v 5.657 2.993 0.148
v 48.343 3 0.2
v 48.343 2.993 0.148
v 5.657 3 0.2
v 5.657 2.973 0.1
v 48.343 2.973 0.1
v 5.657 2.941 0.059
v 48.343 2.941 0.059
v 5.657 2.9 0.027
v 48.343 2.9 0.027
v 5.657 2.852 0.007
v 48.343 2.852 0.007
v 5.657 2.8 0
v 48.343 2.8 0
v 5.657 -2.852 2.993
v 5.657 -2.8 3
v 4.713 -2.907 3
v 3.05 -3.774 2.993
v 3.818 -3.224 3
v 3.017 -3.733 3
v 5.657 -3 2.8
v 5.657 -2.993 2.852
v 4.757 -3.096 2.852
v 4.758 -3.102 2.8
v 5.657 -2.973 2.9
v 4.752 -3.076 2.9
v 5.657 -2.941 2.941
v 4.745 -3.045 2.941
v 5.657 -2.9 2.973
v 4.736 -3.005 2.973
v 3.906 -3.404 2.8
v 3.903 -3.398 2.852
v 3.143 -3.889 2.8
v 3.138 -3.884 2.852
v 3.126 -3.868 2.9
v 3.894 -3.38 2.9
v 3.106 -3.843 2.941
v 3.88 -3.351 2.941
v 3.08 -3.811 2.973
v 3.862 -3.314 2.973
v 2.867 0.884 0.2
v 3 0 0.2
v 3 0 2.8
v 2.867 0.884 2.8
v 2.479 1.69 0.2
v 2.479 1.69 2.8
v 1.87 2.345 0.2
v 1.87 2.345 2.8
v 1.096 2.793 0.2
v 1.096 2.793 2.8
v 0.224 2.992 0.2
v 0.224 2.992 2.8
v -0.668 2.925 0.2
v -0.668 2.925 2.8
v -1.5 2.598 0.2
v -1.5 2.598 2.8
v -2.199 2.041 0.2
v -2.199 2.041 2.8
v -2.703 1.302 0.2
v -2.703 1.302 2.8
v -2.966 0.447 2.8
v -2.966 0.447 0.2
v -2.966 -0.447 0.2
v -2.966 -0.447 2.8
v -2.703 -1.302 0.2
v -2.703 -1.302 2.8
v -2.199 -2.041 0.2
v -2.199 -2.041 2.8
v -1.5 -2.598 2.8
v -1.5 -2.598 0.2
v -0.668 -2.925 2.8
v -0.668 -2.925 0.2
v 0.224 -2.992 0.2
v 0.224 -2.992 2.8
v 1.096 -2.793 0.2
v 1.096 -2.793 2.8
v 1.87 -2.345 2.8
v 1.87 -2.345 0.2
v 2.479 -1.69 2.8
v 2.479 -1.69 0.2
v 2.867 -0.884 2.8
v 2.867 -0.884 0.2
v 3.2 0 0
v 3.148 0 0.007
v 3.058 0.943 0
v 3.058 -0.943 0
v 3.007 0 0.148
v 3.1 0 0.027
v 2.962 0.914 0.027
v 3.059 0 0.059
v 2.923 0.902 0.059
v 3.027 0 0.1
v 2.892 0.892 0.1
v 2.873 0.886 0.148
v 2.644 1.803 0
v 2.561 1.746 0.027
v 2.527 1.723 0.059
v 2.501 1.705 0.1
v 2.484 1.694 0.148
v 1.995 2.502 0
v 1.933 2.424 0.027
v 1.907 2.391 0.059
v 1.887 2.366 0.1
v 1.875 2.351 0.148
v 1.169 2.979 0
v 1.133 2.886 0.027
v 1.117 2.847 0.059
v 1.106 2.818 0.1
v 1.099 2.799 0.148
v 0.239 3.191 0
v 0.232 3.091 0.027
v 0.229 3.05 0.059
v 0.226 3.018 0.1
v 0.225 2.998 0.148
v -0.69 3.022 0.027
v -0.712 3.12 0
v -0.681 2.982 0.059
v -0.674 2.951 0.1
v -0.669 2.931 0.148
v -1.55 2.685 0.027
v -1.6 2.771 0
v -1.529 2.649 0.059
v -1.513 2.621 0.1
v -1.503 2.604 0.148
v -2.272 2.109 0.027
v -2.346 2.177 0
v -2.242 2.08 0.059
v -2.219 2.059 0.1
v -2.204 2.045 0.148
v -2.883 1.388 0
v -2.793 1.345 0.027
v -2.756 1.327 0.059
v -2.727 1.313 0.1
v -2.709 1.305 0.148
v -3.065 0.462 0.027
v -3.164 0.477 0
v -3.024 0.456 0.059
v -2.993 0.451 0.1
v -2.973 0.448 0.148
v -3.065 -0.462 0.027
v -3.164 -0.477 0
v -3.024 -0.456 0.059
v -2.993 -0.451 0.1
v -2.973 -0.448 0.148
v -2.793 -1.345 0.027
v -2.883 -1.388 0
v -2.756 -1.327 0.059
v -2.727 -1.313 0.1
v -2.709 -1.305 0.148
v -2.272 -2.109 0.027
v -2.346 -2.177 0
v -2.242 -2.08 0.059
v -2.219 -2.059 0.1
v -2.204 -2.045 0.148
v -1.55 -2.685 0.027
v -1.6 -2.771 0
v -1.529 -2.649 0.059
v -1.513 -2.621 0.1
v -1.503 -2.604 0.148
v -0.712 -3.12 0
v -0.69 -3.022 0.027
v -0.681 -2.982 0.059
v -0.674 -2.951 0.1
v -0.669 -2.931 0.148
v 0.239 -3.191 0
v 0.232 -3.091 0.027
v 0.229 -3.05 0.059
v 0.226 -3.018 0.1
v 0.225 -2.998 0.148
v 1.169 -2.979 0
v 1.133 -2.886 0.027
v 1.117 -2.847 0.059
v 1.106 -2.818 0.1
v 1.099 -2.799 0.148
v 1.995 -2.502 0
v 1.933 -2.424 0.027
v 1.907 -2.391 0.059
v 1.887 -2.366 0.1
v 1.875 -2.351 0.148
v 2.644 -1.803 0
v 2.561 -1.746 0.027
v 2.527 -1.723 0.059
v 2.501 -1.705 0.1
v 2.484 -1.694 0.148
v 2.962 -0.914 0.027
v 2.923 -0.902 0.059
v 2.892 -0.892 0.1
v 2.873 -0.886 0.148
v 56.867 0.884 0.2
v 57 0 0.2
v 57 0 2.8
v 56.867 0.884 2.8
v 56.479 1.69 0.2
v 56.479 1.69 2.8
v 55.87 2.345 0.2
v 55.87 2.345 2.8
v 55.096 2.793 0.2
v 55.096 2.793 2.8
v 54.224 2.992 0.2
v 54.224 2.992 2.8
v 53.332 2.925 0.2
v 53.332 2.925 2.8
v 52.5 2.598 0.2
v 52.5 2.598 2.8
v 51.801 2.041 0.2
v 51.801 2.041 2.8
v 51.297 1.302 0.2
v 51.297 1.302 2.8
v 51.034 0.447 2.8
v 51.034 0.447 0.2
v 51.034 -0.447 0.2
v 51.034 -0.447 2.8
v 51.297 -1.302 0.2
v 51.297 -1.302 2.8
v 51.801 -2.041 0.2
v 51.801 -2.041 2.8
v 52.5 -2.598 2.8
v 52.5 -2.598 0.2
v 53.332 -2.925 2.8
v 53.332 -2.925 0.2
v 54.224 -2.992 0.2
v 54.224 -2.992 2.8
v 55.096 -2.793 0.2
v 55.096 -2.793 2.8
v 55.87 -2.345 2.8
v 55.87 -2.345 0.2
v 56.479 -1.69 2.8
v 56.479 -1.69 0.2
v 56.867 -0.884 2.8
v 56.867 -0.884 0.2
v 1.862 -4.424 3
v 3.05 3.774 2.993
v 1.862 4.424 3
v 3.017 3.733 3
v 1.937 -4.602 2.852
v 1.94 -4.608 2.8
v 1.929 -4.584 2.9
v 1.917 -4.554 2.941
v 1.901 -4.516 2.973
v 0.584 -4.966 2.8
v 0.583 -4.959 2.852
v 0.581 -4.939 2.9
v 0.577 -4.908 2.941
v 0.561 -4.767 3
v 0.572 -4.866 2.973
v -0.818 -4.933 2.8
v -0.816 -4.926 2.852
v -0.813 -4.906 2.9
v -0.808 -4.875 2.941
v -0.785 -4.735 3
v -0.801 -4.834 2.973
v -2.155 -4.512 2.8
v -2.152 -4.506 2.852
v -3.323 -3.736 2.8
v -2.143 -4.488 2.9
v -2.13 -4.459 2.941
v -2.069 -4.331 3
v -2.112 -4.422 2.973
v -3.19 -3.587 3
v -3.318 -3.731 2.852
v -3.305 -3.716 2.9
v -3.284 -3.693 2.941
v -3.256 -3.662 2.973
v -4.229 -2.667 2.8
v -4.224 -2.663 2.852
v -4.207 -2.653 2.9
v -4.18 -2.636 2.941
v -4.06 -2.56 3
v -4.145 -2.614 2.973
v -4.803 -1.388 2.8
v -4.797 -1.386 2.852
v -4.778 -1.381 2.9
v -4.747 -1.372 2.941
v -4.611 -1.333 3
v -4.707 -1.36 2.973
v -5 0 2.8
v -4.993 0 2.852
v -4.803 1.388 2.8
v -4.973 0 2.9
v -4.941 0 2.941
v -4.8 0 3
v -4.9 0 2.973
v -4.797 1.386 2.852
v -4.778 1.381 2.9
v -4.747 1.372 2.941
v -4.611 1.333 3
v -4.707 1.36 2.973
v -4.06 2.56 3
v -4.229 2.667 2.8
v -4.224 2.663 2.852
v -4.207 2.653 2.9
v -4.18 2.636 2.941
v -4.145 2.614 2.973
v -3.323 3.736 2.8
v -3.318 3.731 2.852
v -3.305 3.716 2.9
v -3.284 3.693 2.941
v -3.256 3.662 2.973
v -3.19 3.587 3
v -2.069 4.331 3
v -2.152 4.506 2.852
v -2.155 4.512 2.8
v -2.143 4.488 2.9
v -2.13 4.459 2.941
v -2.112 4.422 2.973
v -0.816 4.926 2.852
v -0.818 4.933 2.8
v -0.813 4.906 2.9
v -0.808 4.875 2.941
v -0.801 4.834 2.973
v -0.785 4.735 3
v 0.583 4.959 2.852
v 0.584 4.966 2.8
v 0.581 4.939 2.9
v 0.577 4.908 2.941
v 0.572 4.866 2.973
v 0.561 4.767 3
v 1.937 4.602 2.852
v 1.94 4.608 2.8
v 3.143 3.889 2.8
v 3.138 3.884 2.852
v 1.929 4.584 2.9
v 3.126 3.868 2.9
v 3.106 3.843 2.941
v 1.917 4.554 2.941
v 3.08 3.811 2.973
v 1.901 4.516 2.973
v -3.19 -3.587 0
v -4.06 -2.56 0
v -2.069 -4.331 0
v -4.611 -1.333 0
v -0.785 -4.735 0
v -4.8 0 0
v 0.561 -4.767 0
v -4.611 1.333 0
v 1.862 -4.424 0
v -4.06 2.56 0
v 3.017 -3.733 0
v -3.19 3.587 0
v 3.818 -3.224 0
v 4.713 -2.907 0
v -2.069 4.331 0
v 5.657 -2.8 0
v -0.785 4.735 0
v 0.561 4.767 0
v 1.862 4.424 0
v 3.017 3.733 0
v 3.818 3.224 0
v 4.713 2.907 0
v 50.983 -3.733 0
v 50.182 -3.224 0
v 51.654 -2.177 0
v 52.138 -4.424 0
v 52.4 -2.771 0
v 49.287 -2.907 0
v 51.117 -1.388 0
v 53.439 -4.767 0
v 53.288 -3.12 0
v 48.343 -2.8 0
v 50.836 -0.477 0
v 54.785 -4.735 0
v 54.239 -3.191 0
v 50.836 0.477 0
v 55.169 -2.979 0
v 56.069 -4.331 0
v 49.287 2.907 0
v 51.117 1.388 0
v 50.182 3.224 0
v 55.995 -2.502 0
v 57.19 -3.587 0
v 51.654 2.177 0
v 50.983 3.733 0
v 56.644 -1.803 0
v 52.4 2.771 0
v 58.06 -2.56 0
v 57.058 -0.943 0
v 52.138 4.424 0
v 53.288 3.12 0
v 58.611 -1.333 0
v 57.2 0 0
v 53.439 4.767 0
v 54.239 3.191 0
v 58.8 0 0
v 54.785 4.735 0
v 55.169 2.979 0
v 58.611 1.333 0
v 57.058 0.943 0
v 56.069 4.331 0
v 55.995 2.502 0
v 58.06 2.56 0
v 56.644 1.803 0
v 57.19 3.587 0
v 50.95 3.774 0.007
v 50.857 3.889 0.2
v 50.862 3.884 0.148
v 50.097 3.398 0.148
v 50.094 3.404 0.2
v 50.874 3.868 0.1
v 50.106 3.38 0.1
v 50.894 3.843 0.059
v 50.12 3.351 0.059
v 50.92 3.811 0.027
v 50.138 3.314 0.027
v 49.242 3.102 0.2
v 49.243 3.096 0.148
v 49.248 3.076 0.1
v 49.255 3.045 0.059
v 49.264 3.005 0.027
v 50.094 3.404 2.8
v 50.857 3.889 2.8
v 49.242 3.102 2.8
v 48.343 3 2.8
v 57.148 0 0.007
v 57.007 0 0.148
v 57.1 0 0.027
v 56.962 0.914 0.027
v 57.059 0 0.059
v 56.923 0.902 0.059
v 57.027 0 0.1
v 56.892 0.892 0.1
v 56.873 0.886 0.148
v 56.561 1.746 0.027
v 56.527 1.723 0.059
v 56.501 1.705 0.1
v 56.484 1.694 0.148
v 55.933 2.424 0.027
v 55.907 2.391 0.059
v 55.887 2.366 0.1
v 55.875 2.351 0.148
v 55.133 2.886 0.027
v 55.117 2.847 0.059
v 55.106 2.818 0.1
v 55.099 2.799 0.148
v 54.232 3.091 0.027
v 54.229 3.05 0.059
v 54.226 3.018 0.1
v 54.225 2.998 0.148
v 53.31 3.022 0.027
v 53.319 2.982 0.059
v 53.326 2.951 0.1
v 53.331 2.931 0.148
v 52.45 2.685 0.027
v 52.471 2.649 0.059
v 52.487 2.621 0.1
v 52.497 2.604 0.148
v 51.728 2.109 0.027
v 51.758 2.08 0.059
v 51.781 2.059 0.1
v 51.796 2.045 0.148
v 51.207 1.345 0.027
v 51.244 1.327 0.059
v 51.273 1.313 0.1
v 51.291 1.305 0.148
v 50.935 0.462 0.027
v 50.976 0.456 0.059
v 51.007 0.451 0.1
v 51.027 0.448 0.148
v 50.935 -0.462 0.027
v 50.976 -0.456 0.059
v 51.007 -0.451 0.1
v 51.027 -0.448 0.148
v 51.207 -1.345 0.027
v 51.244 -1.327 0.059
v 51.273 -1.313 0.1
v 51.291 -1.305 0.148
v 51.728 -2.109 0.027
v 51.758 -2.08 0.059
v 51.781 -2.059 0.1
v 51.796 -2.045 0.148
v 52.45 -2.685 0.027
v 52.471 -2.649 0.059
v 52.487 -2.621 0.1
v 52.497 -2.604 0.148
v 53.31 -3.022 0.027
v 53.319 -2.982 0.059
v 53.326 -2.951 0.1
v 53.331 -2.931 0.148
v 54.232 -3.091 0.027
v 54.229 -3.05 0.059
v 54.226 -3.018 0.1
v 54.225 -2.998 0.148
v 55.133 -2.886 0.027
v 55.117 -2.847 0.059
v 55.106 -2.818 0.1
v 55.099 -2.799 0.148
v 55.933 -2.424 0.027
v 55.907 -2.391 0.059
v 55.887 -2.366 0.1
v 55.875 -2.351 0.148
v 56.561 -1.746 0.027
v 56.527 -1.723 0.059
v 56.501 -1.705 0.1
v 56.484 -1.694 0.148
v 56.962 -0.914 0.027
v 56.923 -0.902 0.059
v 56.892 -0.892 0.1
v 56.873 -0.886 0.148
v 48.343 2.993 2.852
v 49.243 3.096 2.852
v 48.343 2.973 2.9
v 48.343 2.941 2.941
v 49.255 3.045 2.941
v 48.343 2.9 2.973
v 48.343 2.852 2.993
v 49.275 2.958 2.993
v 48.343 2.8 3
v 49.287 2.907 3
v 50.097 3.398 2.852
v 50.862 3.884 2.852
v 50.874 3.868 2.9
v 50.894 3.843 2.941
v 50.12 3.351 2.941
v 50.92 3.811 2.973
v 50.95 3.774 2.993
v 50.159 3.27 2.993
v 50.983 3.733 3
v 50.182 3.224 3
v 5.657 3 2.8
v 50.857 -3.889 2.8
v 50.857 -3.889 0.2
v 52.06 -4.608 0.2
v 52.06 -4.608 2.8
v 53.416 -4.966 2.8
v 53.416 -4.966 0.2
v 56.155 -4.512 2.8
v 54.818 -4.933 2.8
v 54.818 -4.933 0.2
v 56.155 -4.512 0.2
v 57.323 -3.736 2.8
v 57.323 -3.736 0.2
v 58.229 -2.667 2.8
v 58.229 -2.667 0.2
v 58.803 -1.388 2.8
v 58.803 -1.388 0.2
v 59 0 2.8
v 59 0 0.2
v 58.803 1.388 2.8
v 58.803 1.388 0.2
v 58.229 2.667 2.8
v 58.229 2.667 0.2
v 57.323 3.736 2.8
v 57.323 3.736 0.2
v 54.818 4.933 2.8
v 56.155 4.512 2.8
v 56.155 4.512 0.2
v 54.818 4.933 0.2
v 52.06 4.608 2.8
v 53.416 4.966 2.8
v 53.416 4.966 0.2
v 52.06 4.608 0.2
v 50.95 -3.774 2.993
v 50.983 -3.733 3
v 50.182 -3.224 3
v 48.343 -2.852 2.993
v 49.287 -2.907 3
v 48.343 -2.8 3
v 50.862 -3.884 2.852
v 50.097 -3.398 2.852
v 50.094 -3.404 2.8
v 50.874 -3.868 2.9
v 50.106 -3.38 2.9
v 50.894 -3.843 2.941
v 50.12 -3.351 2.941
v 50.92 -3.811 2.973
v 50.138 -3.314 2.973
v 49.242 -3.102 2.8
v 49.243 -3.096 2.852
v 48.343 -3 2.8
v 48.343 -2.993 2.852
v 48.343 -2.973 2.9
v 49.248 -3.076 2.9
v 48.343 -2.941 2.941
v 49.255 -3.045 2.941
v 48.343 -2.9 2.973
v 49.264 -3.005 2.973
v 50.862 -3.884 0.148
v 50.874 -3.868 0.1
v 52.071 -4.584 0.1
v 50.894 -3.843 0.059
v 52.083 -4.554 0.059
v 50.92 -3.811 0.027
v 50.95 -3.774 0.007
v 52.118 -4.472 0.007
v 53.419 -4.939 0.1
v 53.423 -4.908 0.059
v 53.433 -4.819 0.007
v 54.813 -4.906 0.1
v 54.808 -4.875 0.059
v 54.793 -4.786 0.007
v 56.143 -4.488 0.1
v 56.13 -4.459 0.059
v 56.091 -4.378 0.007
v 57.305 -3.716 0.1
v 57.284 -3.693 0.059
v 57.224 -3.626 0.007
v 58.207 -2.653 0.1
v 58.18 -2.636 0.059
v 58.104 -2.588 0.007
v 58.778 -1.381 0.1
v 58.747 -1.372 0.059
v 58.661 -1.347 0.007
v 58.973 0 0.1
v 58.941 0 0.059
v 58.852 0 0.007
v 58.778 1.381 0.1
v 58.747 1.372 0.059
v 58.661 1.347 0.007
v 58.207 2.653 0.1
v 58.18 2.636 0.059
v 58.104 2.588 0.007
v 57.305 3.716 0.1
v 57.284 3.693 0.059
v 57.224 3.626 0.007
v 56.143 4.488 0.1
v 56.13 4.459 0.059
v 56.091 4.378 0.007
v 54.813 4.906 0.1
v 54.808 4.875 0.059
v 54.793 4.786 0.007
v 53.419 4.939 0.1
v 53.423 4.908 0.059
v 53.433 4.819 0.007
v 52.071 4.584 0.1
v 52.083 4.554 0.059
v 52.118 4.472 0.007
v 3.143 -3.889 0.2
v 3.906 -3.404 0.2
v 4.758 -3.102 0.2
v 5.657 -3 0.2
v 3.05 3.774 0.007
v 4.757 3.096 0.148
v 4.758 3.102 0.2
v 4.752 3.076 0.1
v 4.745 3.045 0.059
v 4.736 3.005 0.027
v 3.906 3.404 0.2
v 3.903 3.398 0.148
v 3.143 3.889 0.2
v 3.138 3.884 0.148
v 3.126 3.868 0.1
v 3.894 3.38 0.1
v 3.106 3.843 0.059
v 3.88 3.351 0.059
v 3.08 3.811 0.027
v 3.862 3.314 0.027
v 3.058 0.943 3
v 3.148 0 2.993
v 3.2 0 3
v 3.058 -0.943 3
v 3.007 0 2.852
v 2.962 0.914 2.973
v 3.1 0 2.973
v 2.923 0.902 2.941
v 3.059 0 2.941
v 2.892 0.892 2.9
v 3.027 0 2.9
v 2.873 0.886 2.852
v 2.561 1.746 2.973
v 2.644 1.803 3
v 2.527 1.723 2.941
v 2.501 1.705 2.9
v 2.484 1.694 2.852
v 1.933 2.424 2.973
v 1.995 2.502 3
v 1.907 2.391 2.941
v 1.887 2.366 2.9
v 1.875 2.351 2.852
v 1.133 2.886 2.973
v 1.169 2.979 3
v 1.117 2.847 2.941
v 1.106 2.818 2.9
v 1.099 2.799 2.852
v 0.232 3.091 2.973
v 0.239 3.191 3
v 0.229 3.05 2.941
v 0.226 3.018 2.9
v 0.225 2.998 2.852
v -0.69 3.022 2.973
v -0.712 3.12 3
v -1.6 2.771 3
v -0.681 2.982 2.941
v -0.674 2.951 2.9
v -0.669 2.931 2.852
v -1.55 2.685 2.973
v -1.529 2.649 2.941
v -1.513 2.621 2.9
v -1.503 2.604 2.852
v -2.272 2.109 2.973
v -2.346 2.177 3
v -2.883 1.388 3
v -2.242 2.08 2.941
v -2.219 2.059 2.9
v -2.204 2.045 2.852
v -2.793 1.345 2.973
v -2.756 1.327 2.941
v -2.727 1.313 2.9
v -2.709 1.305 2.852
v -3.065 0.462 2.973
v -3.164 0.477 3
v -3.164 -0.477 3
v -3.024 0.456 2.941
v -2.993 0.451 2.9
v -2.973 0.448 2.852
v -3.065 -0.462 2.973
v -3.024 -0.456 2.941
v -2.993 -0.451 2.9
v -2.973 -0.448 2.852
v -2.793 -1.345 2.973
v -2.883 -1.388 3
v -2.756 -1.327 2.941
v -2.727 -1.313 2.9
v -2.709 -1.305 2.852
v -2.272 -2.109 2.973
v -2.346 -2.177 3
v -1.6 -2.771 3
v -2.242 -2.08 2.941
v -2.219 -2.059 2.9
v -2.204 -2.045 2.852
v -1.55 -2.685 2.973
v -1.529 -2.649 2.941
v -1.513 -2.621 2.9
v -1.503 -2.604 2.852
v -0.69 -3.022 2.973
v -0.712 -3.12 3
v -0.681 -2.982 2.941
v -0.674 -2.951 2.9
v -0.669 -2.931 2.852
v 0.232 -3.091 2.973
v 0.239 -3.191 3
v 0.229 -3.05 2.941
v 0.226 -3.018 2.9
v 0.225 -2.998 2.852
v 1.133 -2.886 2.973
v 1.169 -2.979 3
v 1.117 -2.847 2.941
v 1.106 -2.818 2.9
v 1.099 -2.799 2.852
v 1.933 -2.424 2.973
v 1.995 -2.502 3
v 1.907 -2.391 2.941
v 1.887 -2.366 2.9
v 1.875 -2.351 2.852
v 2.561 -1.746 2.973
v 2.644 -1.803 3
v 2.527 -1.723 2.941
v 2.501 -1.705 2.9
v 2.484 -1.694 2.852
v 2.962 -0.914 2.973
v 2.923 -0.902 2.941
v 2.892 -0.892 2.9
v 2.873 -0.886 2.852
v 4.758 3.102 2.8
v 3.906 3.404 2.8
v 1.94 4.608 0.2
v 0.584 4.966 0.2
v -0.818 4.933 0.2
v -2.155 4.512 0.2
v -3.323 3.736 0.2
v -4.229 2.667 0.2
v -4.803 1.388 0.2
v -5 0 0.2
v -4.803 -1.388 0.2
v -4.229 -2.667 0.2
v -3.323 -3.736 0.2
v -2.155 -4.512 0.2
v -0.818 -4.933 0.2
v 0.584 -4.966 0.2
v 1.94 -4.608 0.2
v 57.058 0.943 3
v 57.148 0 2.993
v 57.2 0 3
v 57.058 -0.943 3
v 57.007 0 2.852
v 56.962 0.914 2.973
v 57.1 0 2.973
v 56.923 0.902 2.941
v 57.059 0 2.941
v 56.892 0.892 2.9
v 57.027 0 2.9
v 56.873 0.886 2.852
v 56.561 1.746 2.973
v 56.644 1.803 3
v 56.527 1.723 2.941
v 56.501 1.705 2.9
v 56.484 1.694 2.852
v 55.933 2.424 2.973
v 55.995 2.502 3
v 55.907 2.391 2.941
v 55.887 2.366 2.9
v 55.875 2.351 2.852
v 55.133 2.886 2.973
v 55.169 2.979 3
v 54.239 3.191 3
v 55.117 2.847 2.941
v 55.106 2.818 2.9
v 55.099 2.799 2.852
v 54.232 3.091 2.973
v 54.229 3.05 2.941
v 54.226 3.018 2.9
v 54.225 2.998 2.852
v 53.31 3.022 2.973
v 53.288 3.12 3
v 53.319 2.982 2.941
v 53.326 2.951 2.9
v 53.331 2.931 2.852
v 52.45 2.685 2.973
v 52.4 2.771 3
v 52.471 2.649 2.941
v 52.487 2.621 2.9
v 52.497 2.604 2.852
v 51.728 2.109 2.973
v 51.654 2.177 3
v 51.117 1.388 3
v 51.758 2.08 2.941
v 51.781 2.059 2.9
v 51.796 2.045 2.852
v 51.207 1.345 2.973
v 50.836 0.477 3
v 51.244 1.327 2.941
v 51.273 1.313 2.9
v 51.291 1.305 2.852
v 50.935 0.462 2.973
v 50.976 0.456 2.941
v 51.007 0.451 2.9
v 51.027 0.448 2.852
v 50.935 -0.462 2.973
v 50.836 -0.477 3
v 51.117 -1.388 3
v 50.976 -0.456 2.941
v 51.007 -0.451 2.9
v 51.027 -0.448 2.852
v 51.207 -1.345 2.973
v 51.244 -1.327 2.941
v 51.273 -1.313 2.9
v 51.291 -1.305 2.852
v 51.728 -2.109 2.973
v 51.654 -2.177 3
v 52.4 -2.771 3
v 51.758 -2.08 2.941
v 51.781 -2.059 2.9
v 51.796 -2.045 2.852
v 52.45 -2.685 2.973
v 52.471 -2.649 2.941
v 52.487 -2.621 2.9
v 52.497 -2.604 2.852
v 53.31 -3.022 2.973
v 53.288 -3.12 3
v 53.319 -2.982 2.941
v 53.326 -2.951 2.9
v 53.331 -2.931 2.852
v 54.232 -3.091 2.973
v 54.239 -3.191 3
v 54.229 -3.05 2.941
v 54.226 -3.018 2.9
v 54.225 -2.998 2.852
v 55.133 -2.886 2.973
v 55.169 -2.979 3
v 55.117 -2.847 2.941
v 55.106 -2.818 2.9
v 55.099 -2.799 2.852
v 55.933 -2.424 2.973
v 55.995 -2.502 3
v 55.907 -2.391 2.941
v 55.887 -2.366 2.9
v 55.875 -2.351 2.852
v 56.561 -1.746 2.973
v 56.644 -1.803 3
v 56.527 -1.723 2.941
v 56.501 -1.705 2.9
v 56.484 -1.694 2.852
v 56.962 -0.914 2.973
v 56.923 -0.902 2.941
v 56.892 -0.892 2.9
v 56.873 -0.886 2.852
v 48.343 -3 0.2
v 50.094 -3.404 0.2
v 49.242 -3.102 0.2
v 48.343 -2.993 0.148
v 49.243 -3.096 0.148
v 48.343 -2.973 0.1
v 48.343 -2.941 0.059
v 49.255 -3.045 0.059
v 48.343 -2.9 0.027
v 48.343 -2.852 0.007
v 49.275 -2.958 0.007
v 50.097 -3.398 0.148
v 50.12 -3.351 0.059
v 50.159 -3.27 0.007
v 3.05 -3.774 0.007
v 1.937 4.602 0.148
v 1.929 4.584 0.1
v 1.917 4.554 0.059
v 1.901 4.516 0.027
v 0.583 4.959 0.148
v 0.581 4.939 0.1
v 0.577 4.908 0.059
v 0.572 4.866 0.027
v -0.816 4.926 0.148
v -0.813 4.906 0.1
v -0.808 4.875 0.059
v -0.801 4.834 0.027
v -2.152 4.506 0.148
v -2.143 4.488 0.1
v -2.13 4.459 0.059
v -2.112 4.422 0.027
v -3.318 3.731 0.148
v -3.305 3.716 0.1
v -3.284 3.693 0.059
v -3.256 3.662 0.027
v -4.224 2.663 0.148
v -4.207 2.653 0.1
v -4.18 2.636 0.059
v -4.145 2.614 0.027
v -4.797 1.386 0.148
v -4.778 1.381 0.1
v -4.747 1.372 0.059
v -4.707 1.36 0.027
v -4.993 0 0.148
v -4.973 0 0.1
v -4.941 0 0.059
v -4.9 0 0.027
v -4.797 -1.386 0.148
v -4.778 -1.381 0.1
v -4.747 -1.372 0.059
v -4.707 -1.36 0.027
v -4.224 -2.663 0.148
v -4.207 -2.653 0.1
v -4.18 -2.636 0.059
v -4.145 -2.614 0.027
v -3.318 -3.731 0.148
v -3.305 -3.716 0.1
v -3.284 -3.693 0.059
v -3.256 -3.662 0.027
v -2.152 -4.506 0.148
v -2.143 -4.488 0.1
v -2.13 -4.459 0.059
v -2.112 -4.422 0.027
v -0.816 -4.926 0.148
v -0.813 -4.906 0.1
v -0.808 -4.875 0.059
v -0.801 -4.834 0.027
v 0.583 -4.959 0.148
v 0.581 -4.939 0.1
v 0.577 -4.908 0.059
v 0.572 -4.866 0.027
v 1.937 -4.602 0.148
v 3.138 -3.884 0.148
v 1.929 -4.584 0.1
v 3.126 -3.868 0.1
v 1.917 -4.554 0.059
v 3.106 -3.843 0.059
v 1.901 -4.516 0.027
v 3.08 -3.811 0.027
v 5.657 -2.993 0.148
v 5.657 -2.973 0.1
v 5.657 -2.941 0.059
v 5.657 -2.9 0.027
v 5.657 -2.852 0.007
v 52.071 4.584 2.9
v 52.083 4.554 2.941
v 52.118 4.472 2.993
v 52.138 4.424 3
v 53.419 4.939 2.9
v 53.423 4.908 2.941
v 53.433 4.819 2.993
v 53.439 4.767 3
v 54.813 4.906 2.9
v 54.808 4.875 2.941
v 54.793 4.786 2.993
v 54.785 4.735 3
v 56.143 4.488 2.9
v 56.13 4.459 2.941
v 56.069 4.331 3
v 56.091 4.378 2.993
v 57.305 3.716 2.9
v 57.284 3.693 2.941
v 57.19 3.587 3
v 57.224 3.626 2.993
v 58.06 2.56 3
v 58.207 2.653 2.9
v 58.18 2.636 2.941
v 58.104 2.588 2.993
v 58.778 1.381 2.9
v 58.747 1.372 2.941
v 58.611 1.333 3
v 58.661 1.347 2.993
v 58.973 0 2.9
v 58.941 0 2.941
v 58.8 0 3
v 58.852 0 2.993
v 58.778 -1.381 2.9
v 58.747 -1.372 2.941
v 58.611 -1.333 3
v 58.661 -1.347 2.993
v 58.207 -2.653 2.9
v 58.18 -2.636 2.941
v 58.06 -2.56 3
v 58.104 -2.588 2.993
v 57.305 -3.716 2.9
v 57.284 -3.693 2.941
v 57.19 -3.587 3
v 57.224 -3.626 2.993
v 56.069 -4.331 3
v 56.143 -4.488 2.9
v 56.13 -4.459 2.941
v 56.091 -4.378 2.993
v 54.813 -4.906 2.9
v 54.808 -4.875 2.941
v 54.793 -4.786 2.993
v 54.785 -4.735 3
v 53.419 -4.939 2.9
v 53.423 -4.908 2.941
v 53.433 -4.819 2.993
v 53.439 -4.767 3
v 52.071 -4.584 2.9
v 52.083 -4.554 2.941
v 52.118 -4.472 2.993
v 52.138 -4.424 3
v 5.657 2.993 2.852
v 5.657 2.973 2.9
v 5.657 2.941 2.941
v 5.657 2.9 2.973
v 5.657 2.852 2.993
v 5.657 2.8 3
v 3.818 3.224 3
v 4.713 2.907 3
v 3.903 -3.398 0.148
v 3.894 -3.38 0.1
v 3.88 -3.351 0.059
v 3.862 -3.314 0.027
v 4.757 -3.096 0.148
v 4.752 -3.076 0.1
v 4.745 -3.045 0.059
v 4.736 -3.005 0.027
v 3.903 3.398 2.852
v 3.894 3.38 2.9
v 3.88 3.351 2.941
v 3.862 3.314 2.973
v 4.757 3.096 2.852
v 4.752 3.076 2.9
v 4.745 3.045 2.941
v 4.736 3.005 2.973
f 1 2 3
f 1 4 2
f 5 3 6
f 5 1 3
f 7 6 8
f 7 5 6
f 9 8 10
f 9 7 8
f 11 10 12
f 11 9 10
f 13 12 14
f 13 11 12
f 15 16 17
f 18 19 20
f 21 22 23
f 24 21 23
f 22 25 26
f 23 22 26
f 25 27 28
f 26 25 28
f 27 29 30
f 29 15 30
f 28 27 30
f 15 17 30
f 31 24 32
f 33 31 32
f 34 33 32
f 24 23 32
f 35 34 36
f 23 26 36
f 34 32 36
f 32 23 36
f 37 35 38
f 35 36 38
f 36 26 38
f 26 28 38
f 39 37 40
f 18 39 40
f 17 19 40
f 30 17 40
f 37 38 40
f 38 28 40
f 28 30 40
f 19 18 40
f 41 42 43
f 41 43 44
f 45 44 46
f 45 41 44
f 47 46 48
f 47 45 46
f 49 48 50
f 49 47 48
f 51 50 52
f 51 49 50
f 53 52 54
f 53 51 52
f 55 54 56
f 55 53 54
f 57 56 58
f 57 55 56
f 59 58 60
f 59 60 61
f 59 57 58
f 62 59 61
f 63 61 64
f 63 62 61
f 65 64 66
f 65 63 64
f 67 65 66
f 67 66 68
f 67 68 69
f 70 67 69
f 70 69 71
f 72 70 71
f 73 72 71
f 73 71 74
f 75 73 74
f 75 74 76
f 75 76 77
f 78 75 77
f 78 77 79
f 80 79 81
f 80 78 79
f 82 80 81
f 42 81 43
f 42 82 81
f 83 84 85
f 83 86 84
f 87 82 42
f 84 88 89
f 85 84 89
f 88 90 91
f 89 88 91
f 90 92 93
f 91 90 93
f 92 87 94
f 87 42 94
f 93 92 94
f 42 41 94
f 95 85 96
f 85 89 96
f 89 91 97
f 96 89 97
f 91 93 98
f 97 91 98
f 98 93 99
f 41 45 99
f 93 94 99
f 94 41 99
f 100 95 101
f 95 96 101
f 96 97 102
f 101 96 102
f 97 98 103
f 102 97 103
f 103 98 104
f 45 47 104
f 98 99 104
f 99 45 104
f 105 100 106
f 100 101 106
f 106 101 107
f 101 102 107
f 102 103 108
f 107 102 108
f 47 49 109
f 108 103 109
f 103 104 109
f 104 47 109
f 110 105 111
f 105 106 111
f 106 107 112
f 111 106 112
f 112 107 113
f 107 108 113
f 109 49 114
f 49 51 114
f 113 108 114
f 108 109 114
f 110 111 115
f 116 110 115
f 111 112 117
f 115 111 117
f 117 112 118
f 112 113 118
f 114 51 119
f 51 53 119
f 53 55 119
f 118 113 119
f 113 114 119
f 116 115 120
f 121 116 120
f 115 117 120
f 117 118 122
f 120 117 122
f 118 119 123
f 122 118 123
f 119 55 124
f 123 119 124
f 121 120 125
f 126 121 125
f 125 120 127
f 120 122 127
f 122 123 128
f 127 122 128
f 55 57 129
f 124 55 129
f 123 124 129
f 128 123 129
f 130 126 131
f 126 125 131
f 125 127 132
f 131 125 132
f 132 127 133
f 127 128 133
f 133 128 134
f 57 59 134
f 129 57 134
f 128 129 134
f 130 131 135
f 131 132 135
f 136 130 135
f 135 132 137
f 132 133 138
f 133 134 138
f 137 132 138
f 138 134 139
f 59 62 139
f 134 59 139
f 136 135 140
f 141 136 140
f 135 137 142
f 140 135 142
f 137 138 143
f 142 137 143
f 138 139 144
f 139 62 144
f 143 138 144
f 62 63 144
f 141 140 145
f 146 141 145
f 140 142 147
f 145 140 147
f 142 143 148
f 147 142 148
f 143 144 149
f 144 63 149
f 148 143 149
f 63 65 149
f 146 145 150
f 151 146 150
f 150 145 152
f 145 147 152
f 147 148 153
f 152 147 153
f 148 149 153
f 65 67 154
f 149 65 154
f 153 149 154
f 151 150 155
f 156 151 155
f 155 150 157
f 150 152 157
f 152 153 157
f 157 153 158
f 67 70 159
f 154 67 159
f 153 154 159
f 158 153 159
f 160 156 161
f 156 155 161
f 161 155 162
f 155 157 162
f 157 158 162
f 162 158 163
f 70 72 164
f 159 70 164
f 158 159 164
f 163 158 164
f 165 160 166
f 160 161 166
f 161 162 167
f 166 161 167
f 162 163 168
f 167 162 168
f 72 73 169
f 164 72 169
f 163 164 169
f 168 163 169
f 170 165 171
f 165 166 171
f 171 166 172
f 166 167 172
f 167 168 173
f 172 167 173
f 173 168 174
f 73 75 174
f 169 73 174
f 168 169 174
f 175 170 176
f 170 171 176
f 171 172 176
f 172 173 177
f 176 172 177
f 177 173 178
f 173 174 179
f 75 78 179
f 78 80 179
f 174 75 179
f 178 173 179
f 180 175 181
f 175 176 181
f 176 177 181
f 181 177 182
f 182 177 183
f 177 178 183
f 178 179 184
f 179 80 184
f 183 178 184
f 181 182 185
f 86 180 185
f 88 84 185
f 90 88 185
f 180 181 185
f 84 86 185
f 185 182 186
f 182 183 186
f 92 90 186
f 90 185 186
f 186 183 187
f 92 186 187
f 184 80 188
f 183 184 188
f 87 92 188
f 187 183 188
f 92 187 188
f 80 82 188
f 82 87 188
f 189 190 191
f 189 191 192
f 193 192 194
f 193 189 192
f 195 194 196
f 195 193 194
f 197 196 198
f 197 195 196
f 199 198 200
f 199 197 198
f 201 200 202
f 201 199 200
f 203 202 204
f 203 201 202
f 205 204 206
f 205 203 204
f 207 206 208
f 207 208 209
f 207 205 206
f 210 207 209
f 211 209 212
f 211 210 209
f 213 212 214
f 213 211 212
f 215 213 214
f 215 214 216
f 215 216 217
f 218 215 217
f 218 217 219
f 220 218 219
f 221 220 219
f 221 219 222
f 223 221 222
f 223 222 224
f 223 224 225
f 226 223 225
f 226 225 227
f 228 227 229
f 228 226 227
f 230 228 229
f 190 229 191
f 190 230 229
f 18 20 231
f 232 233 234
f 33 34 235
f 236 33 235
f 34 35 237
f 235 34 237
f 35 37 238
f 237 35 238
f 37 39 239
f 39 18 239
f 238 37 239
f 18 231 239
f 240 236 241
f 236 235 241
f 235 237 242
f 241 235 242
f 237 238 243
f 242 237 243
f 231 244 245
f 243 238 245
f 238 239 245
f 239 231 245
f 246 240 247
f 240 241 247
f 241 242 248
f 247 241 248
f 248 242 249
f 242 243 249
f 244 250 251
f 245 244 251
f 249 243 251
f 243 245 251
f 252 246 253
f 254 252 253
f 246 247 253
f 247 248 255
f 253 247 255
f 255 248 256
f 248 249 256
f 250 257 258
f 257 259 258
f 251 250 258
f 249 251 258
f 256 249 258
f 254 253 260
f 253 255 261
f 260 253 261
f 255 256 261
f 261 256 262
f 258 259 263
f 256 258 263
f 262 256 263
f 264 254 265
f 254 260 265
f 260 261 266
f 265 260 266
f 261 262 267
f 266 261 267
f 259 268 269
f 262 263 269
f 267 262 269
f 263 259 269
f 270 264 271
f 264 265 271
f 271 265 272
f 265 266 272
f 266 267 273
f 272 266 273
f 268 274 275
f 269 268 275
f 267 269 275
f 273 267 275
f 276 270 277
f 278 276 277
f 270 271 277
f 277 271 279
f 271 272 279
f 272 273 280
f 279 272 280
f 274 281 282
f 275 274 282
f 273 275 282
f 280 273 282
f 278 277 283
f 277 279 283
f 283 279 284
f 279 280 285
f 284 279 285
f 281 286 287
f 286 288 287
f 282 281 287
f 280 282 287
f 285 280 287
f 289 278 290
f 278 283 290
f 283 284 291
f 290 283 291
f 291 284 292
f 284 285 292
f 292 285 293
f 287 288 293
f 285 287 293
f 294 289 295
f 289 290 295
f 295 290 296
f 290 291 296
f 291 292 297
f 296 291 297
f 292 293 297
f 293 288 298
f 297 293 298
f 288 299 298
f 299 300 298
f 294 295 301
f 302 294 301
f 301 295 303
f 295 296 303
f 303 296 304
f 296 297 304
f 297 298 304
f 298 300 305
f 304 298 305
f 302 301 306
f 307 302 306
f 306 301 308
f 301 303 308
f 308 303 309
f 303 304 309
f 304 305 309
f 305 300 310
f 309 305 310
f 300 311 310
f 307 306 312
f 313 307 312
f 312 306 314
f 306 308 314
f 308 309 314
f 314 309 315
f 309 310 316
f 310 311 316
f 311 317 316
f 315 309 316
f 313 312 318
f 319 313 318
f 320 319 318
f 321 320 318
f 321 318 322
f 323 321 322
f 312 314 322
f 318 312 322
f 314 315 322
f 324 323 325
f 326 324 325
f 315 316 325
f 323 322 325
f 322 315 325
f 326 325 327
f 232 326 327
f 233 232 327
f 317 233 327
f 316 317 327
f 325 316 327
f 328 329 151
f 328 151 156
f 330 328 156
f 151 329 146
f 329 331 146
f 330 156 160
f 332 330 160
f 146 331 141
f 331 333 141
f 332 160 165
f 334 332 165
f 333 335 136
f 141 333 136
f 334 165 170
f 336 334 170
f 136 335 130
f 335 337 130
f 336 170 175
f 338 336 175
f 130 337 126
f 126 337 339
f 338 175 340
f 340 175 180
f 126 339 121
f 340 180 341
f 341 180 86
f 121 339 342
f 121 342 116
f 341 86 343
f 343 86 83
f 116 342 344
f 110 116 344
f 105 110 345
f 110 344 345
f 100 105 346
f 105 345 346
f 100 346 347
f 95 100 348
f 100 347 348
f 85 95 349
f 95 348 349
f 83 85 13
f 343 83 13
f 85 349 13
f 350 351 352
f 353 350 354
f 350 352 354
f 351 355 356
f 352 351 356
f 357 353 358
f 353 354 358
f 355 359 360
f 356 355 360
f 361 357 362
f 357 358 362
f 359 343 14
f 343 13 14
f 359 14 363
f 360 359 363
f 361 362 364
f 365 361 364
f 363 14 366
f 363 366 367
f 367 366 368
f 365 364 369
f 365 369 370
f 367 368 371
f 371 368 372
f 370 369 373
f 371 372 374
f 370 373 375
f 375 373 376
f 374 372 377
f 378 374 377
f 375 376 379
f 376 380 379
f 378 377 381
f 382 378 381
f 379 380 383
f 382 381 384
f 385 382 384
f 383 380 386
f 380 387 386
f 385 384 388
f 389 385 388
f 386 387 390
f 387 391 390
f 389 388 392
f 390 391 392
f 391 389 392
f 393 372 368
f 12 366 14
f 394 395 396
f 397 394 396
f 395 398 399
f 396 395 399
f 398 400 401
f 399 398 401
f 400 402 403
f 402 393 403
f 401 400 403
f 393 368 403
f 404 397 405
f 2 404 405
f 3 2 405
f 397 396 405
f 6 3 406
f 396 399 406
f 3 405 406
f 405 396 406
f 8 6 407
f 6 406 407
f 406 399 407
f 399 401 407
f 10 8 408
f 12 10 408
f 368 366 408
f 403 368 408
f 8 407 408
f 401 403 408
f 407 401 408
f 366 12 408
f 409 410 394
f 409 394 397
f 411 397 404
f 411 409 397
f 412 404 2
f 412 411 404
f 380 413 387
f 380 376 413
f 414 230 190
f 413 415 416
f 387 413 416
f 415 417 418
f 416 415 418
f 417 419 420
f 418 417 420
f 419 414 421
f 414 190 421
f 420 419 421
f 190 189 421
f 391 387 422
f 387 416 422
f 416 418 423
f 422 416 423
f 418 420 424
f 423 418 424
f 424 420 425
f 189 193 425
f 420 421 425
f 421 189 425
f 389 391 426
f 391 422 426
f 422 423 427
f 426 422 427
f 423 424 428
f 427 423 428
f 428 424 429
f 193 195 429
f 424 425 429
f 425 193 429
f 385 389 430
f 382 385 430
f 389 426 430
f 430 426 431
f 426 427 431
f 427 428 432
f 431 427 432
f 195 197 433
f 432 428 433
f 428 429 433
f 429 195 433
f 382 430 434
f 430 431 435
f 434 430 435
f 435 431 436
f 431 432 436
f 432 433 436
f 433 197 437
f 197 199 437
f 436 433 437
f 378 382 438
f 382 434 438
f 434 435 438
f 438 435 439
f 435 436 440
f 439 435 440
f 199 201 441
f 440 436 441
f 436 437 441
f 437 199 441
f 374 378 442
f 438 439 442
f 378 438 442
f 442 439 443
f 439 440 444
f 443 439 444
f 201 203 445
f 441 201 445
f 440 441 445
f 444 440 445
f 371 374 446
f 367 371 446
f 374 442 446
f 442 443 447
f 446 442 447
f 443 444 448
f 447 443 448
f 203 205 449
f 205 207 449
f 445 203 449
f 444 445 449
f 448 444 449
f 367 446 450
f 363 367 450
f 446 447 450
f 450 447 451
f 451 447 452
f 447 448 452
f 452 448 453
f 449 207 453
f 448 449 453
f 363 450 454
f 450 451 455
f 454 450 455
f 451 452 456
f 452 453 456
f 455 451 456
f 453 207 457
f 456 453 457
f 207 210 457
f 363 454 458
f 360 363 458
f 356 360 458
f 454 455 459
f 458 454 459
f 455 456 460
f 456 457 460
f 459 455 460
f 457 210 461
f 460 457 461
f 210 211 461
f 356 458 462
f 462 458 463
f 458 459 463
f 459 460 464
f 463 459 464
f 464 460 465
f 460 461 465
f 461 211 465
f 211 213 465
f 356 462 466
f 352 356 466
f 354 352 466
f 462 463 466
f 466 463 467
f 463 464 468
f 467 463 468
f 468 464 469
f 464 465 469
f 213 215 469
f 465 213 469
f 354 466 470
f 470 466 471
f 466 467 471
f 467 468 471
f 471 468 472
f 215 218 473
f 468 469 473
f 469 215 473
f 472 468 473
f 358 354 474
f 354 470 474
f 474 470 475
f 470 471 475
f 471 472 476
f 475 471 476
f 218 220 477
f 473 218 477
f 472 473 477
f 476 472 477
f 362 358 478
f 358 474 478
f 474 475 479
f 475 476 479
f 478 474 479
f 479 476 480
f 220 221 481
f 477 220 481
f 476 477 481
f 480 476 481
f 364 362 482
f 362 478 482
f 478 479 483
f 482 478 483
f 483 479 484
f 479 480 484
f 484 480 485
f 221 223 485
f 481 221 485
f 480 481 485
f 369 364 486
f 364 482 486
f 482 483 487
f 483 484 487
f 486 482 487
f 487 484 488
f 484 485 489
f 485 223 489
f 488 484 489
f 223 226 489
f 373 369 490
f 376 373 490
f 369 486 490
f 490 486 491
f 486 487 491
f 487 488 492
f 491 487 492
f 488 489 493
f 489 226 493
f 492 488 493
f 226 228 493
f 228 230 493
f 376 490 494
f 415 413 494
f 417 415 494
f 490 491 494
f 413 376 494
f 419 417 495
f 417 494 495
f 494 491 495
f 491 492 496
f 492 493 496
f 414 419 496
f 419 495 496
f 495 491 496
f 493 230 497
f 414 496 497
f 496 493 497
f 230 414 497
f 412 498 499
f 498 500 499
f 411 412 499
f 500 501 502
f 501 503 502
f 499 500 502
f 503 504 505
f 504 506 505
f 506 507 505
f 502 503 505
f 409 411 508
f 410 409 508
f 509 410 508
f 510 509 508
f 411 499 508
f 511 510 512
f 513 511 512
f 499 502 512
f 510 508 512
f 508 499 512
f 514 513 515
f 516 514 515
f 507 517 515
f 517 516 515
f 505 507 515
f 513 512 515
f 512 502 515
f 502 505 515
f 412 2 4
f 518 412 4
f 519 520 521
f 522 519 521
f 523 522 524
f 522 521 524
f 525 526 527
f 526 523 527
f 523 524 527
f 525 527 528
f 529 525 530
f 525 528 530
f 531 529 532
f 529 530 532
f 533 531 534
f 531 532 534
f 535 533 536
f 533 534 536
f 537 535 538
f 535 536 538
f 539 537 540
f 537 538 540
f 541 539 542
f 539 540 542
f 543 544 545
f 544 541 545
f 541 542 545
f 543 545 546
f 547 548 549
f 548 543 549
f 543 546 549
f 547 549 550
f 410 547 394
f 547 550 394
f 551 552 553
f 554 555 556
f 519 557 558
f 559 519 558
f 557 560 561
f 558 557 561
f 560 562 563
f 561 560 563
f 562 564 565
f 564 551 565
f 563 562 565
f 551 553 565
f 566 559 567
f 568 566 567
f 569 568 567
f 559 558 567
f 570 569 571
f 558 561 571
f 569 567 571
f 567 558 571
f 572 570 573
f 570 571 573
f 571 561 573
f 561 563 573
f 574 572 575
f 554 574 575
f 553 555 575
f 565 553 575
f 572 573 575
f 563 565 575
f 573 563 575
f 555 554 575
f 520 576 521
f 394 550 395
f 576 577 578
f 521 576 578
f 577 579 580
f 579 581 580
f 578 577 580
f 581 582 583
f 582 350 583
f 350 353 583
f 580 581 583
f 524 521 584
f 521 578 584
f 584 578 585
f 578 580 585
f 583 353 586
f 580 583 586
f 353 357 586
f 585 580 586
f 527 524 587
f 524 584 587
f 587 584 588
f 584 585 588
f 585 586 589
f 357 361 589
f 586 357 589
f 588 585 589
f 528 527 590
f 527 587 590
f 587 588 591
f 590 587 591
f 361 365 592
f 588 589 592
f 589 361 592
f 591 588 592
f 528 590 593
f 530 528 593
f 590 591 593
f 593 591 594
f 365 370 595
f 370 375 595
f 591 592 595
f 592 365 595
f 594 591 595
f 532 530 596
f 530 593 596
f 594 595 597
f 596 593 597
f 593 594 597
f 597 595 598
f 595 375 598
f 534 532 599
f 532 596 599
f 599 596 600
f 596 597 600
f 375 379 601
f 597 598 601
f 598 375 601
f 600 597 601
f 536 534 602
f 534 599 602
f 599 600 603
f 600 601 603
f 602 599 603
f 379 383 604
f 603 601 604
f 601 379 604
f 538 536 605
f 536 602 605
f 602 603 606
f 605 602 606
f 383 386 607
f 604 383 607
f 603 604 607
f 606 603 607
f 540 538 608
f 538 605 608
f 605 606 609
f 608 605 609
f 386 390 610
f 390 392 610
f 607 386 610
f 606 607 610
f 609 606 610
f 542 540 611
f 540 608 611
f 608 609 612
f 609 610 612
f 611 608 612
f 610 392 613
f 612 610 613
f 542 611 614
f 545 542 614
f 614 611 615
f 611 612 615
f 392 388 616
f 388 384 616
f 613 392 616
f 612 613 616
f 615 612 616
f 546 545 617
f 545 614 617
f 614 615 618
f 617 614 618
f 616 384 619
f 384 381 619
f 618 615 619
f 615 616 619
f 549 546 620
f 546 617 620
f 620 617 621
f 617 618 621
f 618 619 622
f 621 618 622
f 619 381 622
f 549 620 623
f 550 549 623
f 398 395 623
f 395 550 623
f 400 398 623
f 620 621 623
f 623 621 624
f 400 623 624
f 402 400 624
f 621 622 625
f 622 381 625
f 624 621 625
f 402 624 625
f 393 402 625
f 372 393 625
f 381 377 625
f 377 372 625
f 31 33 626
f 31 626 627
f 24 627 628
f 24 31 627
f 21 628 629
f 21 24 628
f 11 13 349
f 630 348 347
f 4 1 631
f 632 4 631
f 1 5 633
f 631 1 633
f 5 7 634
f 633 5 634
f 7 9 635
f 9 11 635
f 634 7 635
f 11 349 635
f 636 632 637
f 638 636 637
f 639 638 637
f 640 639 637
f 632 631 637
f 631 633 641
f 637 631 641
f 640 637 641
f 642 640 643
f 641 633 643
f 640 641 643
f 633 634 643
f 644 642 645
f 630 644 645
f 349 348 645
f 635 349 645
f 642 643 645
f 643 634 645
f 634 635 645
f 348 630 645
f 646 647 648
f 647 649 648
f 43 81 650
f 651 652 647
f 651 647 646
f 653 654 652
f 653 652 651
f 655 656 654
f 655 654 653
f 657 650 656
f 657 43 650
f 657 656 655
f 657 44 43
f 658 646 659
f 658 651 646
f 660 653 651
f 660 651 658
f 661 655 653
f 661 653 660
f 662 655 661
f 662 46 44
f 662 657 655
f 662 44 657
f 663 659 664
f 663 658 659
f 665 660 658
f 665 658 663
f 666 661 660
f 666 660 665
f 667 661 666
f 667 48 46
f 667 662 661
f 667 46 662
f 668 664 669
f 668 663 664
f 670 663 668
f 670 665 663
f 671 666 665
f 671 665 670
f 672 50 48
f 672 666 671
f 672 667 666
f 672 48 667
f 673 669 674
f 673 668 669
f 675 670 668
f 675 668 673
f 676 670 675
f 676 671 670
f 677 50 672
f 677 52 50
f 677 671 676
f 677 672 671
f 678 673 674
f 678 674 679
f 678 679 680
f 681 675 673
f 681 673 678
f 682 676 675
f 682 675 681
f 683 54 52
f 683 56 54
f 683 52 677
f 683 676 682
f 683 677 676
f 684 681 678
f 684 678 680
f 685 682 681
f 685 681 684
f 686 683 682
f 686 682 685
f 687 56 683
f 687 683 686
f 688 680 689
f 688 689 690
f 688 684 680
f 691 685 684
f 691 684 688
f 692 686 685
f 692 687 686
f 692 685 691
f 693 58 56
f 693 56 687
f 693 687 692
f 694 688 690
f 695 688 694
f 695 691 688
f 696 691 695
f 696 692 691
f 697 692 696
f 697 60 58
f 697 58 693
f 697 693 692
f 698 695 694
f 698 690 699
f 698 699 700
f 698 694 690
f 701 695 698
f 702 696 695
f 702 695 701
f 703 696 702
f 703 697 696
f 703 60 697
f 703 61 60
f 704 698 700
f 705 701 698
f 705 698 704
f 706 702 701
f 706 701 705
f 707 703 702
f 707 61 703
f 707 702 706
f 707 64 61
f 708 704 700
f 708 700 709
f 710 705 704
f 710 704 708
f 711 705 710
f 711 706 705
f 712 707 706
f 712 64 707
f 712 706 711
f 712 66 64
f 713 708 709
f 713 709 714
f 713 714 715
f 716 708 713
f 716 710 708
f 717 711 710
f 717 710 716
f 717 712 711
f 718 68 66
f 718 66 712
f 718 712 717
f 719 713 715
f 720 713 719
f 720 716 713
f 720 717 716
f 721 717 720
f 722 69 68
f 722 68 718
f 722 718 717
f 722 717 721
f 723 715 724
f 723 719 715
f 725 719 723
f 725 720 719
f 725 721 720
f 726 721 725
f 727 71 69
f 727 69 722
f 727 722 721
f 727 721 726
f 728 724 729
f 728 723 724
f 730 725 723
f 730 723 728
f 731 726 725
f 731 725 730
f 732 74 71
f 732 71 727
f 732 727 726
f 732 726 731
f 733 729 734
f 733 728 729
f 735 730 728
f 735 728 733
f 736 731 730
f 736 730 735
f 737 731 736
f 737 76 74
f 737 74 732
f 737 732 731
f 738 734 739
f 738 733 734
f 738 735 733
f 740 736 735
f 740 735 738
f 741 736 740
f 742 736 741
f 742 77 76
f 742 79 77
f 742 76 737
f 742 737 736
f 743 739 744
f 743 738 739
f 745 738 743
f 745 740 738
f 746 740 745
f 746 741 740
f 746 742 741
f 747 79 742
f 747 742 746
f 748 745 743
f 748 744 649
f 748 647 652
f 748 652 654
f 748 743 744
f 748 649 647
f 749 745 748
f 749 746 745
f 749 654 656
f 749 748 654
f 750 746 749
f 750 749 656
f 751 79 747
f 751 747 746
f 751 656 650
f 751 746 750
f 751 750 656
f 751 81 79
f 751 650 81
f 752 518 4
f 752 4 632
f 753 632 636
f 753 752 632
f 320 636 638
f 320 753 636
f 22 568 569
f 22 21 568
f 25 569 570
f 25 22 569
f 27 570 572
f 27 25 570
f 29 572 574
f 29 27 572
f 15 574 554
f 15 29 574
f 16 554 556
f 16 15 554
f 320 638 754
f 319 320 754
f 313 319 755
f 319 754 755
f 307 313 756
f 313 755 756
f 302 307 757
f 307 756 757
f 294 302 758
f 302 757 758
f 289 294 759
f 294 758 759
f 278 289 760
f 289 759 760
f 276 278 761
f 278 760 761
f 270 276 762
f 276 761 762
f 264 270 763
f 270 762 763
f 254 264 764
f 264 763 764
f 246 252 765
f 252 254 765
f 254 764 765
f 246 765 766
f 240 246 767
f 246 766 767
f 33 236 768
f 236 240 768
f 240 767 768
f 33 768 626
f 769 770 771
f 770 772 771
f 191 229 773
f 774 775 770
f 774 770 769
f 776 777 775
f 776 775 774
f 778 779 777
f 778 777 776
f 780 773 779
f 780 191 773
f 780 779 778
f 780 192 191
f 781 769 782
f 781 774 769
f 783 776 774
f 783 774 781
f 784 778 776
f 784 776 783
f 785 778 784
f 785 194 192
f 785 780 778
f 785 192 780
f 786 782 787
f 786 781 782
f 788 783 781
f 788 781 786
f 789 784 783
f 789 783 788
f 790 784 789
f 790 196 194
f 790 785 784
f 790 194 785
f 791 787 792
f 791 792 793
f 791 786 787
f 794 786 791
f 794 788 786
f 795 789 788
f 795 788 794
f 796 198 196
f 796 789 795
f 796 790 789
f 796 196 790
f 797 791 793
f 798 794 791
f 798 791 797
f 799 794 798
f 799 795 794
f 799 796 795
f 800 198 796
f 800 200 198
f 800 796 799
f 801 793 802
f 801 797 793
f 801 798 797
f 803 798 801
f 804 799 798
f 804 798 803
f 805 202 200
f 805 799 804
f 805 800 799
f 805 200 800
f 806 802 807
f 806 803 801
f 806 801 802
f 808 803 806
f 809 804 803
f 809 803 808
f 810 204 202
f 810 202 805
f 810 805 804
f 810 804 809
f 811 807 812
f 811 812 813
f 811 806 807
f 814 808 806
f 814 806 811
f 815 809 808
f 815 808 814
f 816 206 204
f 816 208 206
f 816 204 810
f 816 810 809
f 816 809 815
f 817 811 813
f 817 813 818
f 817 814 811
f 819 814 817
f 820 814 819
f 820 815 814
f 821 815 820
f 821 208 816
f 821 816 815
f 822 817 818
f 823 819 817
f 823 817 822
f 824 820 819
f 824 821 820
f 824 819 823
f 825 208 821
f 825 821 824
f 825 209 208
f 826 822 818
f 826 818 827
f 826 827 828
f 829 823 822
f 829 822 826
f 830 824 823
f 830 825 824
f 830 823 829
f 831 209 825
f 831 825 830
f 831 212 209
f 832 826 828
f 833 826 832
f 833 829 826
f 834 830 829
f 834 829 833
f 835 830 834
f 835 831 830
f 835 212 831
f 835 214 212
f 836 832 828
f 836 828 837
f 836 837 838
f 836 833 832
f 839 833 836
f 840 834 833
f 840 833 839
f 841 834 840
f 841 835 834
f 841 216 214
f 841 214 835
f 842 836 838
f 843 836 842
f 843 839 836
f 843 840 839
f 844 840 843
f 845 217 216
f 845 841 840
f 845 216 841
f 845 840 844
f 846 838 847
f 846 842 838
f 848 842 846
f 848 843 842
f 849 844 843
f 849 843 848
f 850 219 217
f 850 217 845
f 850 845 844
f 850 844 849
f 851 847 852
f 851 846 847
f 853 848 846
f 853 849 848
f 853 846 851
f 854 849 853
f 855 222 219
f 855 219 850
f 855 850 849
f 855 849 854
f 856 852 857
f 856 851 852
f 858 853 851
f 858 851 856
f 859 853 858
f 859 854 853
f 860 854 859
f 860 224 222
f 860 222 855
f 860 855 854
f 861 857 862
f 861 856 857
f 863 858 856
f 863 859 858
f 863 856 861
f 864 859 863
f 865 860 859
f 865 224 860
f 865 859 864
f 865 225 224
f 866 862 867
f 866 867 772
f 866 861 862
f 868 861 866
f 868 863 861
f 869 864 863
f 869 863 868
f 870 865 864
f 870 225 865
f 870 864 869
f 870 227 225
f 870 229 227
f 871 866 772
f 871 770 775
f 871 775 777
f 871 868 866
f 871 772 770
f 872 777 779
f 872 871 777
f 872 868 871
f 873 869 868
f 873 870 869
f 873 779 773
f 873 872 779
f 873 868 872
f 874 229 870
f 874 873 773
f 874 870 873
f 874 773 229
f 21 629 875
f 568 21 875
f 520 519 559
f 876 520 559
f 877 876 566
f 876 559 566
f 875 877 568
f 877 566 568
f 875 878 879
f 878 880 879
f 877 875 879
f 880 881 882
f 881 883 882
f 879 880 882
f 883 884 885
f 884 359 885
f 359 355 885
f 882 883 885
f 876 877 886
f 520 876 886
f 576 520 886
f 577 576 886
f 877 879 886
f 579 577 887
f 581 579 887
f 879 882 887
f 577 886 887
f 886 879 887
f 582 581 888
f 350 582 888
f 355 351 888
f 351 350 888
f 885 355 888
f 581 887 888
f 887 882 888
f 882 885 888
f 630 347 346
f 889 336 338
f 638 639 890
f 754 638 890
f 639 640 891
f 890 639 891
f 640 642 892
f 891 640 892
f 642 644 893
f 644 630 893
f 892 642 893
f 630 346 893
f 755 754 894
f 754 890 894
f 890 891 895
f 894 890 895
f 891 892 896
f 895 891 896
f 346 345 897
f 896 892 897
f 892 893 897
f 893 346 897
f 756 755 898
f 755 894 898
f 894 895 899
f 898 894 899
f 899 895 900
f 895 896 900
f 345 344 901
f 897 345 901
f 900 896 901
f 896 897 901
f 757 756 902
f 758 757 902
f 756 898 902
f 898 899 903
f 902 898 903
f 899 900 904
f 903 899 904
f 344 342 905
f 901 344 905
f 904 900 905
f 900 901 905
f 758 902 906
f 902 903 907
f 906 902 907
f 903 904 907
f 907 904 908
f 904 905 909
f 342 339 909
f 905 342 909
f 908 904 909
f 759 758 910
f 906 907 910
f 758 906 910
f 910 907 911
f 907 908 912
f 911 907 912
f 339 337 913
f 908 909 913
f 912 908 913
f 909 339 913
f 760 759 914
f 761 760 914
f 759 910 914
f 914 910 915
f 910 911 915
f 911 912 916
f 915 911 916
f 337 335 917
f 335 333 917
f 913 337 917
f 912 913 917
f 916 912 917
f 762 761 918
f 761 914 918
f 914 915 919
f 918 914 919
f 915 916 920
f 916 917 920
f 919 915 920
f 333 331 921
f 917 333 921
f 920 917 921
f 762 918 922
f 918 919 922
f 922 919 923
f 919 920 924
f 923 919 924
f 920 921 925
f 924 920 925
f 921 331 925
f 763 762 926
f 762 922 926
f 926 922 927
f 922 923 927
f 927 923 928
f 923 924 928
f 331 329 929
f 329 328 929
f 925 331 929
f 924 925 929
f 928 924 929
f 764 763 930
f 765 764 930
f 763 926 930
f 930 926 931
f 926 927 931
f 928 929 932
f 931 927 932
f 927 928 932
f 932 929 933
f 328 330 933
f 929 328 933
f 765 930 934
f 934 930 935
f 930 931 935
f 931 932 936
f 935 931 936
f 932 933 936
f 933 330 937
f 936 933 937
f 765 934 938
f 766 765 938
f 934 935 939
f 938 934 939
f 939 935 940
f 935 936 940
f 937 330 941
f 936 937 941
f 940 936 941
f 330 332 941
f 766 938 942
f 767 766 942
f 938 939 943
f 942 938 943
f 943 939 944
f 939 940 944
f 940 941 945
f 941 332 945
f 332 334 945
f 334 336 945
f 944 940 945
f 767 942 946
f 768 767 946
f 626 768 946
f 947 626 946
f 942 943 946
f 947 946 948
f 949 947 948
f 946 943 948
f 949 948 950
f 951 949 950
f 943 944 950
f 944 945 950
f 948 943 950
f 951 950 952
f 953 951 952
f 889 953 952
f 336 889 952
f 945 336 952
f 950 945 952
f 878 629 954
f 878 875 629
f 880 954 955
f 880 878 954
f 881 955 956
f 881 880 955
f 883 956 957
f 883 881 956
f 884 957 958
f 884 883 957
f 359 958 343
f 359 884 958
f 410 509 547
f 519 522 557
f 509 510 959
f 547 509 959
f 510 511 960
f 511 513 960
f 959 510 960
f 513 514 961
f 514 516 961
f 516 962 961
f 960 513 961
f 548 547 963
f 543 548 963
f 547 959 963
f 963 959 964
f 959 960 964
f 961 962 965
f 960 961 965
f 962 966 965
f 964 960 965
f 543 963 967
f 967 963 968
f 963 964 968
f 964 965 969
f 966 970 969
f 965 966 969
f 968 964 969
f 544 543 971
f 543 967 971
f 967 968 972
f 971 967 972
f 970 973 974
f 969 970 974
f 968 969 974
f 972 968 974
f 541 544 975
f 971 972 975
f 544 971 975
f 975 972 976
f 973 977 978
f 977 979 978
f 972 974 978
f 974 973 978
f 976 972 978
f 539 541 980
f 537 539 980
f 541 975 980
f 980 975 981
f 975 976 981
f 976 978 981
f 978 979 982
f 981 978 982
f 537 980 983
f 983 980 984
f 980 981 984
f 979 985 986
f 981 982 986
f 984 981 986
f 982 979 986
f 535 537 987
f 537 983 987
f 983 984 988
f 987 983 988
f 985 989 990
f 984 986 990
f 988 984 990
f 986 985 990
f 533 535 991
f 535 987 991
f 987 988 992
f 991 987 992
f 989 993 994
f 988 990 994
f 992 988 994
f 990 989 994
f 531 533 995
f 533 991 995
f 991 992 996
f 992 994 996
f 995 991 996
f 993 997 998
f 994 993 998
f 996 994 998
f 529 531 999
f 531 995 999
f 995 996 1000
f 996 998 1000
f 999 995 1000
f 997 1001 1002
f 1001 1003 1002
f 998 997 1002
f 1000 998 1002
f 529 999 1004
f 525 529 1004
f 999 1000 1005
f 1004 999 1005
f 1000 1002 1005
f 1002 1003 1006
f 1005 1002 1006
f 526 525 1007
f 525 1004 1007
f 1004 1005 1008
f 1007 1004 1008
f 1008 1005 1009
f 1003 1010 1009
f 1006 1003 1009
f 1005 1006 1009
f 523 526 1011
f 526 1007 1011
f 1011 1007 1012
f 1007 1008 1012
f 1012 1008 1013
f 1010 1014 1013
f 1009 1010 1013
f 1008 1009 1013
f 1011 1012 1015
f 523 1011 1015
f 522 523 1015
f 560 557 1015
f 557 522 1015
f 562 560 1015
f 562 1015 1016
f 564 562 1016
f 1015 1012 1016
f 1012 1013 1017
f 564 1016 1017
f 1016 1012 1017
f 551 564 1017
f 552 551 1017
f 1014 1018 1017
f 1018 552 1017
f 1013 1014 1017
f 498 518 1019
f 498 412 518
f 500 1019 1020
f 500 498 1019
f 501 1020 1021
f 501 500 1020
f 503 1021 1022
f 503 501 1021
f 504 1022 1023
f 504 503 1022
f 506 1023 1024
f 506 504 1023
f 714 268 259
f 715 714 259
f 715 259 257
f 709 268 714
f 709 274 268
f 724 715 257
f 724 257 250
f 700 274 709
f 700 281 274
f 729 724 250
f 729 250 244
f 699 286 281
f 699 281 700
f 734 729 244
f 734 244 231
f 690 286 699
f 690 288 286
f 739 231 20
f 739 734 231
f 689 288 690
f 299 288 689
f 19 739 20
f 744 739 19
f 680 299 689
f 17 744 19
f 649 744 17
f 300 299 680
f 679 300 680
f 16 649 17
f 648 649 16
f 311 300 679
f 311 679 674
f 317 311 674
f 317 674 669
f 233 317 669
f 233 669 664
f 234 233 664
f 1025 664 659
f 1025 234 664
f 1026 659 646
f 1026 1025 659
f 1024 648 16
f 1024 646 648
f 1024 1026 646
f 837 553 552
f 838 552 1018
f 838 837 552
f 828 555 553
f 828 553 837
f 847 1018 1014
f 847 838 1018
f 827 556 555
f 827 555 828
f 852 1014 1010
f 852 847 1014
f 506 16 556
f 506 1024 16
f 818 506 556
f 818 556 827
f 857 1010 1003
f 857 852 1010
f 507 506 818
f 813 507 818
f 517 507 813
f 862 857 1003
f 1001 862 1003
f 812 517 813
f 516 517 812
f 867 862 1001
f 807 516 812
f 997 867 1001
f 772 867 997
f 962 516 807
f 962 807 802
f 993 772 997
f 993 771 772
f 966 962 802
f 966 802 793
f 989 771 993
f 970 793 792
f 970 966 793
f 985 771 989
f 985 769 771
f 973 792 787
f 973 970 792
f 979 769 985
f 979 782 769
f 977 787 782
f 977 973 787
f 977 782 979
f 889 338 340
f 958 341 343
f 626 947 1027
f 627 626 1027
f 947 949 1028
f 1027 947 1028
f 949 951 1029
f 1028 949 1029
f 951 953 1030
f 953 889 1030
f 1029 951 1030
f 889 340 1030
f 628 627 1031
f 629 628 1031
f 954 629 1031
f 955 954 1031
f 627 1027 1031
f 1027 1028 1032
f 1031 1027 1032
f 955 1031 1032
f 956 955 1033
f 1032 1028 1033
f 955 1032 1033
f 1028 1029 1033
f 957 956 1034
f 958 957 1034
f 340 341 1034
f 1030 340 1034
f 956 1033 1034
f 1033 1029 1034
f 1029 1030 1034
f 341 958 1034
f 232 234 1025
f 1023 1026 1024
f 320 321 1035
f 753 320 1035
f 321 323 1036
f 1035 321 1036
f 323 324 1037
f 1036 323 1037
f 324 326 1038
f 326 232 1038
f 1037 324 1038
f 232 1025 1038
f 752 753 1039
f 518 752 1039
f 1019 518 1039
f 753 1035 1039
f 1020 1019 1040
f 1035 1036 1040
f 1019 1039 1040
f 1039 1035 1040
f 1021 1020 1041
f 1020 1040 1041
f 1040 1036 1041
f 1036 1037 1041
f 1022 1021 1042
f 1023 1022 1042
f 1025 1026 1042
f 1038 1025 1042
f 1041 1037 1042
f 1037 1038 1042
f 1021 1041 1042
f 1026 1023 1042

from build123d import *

# Parameters (mm, degrees)
SKETCH2_R           = 5
SKETCH2_R_2         = 3
BOSS_EXTRUDE1_DEPTH = 3
FILLET1_R           = 4
FILLET2_R           = 0.2


with BuildPart() as part:
    # Sketch2 → Boss-Extrude1 (new body)
    # profile 1 of 3: a face of its own
    with BuildSketch(Plane.XY):
        Circle(SKETCH2_R)
        Circle(SKETCH2_R_2, mode=Mode.SUBTRACT)
    # profile 2 of 3: a face of its own
    with BuildSketch(Plane.XY):
        with BuildLine():
            Line((4, -3), (50, -3))
            ThreePointArc((50, -3), (49, 0), (50, 3))
            Line((50, 3), (4, 3))
            ThreePointArc((4, 3), (4.74341649, 1.58113883), (5, 0))
            ThreePointArc((5, 0), (4.74341649, -1.58113883), (4, -3))
        make_face()
    # profile 3 of 3: a face of its own
    with BuildSketch(Plane.XY):
        with Locations((54, 0)):
            Circle(SKETCH2_R)
        with Locations((54, 0)):
            Circle(SKETCH2_R_2, mode=Mode.SUBTRACT)
    extrude(amount=BOSS_EXTRUDE1_DEPTH)

    # Fillet1
    fillet1_edges = [part.edges().sort_by_distance(p)[0] for p in [
        (4, 3, 1.5),
        (50, 3, 1.5),
        (50, -3, 1.5),
        (4, -3, 1.5),
    ]]
    fillet(fillet1_edges, radius=FILLET1_R)

    # Fillet2
    fillet2_edges = [part.edges().sort_by_distance(p)[0] for p in [
        (-3, 0, 0),
        (59, 0, 0),
        (59, 0, 3),
        (27, -3, 0),
        (27, -3, 3),
        (-5, 0, 0),
        (-5, 0, 3),
        (27, 3, 0),
        (27, 3, 3),
        (49.676479084, -3.228763834, 0),
        (49.676479084, -3.228763834, 3),
        (4.323520916, -3.228763834, 0),
        (4.323520916, -3.228763834, 3),
        (51, 0, 3),
        (49.676479084, 3.228763834, 0),
        (49.676479084, 3.228763834, 3),
        (4.323520916, 3.228763834, 0),
        (4.323520916, 3.228763834, 3),
        (-3, 0, 3),
        (51, 0, 0),
    ]]
    fillet(fillet2_edges, radius=FILLET2_R)


solid = part.part
